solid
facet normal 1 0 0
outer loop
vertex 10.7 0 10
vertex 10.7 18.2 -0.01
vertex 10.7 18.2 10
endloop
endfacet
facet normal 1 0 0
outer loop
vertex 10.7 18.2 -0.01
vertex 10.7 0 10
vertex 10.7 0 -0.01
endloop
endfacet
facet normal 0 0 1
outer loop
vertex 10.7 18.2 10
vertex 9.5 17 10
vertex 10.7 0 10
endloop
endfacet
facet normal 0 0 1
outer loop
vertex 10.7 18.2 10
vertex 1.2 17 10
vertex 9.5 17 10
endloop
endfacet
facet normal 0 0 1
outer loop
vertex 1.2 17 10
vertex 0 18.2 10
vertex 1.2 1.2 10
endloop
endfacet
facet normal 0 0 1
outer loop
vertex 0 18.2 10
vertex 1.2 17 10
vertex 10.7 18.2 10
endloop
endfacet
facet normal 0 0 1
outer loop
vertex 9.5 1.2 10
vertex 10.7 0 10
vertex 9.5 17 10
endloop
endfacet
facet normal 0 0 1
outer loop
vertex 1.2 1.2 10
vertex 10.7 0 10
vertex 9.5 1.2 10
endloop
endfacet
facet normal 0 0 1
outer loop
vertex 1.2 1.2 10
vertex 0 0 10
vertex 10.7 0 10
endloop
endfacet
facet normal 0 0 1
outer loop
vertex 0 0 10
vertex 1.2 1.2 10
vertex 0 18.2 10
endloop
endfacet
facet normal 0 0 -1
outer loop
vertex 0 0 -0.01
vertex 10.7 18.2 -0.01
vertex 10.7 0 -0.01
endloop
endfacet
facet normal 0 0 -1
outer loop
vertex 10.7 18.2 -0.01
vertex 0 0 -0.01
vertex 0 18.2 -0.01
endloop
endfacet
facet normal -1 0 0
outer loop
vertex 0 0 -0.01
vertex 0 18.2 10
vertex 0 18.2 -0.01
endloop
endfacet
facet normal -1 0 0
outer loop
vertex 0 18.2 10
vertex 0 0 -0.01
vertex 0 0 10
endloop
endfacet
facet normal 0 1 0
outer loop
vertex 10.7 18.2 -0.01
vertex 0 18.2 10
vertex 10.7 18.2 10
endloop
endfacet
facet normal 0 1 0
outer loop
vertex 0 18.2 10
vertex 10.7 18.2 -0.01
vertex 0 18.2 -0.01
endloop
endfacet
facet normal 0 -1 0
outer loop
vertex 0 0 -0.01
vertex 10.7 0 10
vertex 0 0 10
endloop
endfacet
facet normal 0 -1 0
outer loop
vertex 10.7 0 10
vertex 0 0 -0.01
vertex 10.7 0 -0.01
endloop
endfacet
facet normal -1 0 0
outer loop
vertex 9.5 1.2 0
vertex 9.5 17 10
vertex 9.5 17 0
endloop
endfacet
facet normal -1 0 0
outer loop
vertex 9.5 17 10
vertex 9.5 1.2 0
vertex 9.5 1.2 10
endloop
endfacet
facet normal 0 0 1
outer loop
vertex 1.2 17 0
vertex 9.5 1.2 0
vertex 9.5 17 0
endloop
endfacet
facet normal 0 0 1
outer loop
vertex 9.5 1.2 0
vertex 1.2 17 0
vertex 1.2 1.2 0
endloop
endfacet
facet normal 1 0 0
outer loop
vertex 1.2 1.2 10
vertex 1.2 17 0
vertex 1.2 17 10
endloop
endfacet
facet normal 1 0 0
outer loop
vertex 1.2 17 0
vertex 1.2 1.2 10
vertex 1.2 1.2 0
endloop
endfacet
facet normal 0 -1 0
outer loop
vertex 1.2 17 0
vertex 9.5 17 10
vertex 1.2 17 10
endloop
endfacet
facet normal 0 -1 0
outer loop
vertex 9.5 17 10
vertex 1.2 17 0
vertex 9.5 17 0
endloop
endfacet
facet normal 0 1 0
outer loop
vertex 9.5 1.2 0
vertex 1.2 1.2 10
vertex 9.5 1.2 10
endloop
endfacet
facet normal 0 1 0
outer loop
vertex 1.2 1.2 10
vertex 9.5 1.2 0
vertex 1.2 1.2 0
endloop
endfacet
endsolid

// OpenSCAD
// file: ../Base/Rotation.scad
// Fischertechnik Box Foundation
// Geometry Helpers Rotation

include <PlacementOptions.scad>

// getRotatedSpace(space, rotation=NoRotation)
// Rotates the space dependent on the specified rotation

function getRotatedSpace(space, rotation=NoRotation) = [
    (rotation == Rotate90 || rotation == Rotate270) ? space.y : space.x,
    (rotation == Rotate90 || rotation == Rotate270) ? space.x : space.y
];

// Rotates the given space around the fixed left lower corner
// space = the space the children needs as width/depth list [width,depth]
// rotation = 0 Rotate0 degrees, 1 Rotate90 degrees, 2 Rotate180 degrees, 3 Rotate270 degrees (equivalent to -90)

module RotateFix(space, rotation=NoRotation) {
    dy = (rotation == Rotate0 || rotation == Rotate270) ? 0 :
        (rotation == Rotate90) ? space.x :
        space.y;
    dx = (rotation < Rotate180) ? 0 :
        (rotation == Rotate180) ? space.x :
        space.y;
    
    translate([dx, dy, 0])
        rotate([0, 0, rotations[rotation]])
            children();
}
// file: ../Base/Alignment.scad
// Fischertechnik Box Foundation
// Geometry Helpers Alignment

include <PlacementOptions.scad>

// getAlignedX(elementWidth, spaceWidth, align=AlignRight, offset=0)
// Gets the aligned X offset of an element with the given
// width in the given space.
// elementWidth = The width of the element to positon
// spaceWidth = The space where the element should be aligned
// align = 0 AlignLeft, 1 AlignCenter, 2 AlignRight
// offset = an optional offset from the aligned position. When
// aligned left or centered, then positive values are in X direction.
// When aligned right then positive values are in negative X direction.

function getAlignedX(elementWidth, spaceWidth, align=AlignRight, offset=0) =
    (align == AlignLeft) ?
        offset :
        ((align == AlignCenter) ?
        (spaceWidth - elementWidth)/2 + offset :
        spaceWidth - offset - elementWidth);

// getAlignedY(elementDepth, spaceDepth, align=AlignTop, offset=0)
// Gets the aligned Y offset of an element with the given
// depth in the given space.
// elementDepth = The depth of the element to positon
// spaceDepth = The space where the element should be aligned
// align = 0 AlignBottom, 1 AlignCenter, 2 AlignTop
// offset = an optional offset from the aligned position. When
// aligned bottom or centered, then positive values are in Y direction.
// When aligned top then positive values are in negative Y direction.

function getAlignedY(elementDepth, spaceDepth, align=AlignTop, offset=0) =
    (align == AlignBottom) ?
        offset :
        ((align == AlignCenter) ?
        (spaceDepth - elementDepth)/2 + offset :
        spaceDepth - offset - elementDepth);
// file: ../Base/PlacementOptions.scad
// Fischertechnik Box Foundation
// Placement Options

// Alignment
NoAlign = 0;
AlignLeft = 1;
AlignBottom = 2;
AlignCenter = 3;
AlignRight = 4;
AlignTop = 5;

// Element rotation degree steps
rotations = [0, -90, -180, -270];

// Rotation
NoRotation = 0;
Rotate0 = 0;
Rotate90 = 1;
Rotate180 = 2;
Rotate270 = 3;

// Docking (seen from above)
NoDock = -1;
DockLeft = 0;
DockTop = 1;
DockRight = 2;
DockCorner = 2;
DockBottom = 3;

// Web corners
LowerLeft = 0;
UpperLeft = 1;
UpperRight = 2;
LowerRight = 3;

// Web position relative to corner
LeftOfCorner = 0;
RightOfCorner = 1;

// Rails direction
Horizontal = true;
Vertical = false;
// file: ../Base/Boxes.scad
// Fischertechnik Box Foundation
// Pre-designed Boxes

use <Constants.scad>

include <PlacementOptions.scad>

box190Width = 190.6;
box190Depth = 130.6;
box130Width = 130.6;
box130Depth = 95.6;

// Values are from an original Box 1000 sorting box
topBottomDifference = 1.7;
outerHeight = 40;
baseThickness = 1.2;
innerHeight = outerHeight - baseThickness;
stackExcess = 5.7;
radius = 2.5;
wallThickness = 1.2;
tolerance = 0.2;

boxWallThickness = wallThickness;
boxBaseThickness = baseThickness;
boxWebWidth = 3.0;

// getBoxWallThickness()
// Gets the wall thickness of a Fischertechnik Box
function getBoxWallThickness() = boxWallThickness;

// getBoxUsageHeight(height = 38.2)
// Gets the usable height of a Fischertechnik box
// height = Outer height of the box from the bottom to the upper edge.
function getBoxUsageHeight(height = outerHeight) = height - baseThickness - stackExcess;

// getBoxInnerHeight()
// Gets the inner height of a Fischertechnik box, including the stack excess
function getBoxInnerHeight() = innerHeight;

// getBoxBaseThickness()
// Gets the thickness of the Fischertechnik box base.
function getBoxBaseThickness() = boxBaseThickness;

// getBoxWebWidth()
// Gets the width of a box web
function getBoxWebWidth() = boxWebWidth;

// getBox190Space()
// Gets the usable inner space of a Box 190 as an x/y-list
function getBox190Space() = [
    box190Width - 2*getBoxWallThickness() - topBottomDifference, 
    box190Depth - 2*getBoxWallThickness() - topBottomDifference ];

// RoundedCornerPlate(width, depth, height, radius)
// Creates a body plate with rounded corners for a box. Used
// also to create the complete box with the hull module.
// width = Width of the plate
// depth = depth of the plate 
// height = thickness of the plate
// radius = radius of the rounded corner
module RoundedCornerPlate(width, depth, height, radius) {
    translate([radius, radius])
    hull() {
        w = width-2*radius;
        d = depth-2*radius;
        cube([w, d, height]);
        cylinder(height, r=radius, $fn=getFragments());
        translate([w, 0])
            cylinder(height, r=radius, $fn=getFragments());
        translate([w, d])
            cylinder(height, r=radius, $fn=getFragments());
        translate([0, d])
            cylinder(height, r=radius, $fn=getFragments());
    }
}

// BoxBase(width, depth)
// Creates an empty stackable Fischertechnik compatible box
// width = Outer width of the box (190, 130, ...)
// depth = Outer depth of the box (130, 95, ...)

module BoxBase(width, depth, height=outerHeight) {    
    thinPlate = 0.01;

    innerHeight = height - baseThickness;    
    
    module Body(tolerance=tolerance) {
        hull() {
            // Bottom with tolerance to fit into the original boxes when stacked
            translate([-wallThickness+tolerance, -wallThickness+tolerance, -baseThickness])
                RoundedCornerPlate(width-topBottomDifference-2*tolerance, depth-topBottomDifference-2*tolerance, thinPlate, radius);
            
            // Top
            translate([-wallThickness-topBottomDifference/2, -wallThickness-topBottomDifference/2, innerHeight-thinPlate])
                RoundedCornerPlate(width, depth, thinPlate, radius);                
         }
    }

    module Cutoff() {
        hull() {
            coWidth = width - 2*wallThickness;
            coDepth = depth - 2*wallThickness;
            
            // Bottom
            RoundedCornerPlate(coWidth-topBottomDifference, coDepth-topBottomDifference, thinPlate, radius);

            // Top
            translate([-topBottomDifference/2, -topBottomDifference/2, innerHeight+thinPlate]) 
                RoundedCornerPlate(coWidth, coDepth, thinPlate, radius);
        }
    }
    
    difference() {        
        Body();
        Cutoff();
        stackOffset = innerHeight - stackExcess;
        translate([0, 0, stackOffset + baseThickness])
            Body(tolerance=0);
    }
}

// Creates the Fischertechnik empty box 130x190 mm and places it at position 0,0
// 190x130 are the outer sizes, the inner space is slightly smaller. Use getBox190Space() to get the inner sizes.
// The box is positioned that the usable inner space is at the 0,0,0 position.

module Box190() {
    BoxBase(box190Width, box190Depth);
}

// Gets the usable inner space of a Box 130 as an x/y-list
function getBox130Space() = [
    box130Width - 2*getBoxWallThickness() - topBottomDifference, 
    box130Depth - 2*getBoxWallThickness() - topBottomDifference ];

// Creates the Fischertechnik empty box 95x130 mm and places it at position 0,0
// 190x130 are the outer sizes, the inner space is slightly smaller. Use getBox190Space() to get the inner sizes.
// The box is positioned that the usable inner space is at the 0,0,0 position.

module Box130() {
    BoxBase(box130Width, box130Depth);
}

// Creates a web at the specified box walls
// corner 0 = LowerLeft, 1 = UpperLeft, 2 = UpperRight, 3 = LowerRight
// side 0 = LeftOfCorner, 1 = RightOfCorner
// distance = Distance in mm from the corner
// boxSpace = inner width and depth of the box (default: Box 190)
// webWidth = length of the web (default is 3 mms)
// webThickness = thickness of the web (default is 1 mm)
// height = Height of the web (standard is getBoxUsageHeight())
// sink = How much of the web is sunk into the wall

module BoxWeb(
    corner, 
    side, 
    distance, 
    boxSpace=getBox190Space(), 
    webWidth=getBoxWebWidth(), 
    webThickness=1.0, 
    height=getBoxUsageHeight(),
    sink = getBoxWallThickness()/2) {
    width = (corner % 2 == 0) ? 
            (side == LeftOfCorner ? webWidth : webThickness) :
            (side == LeftOfCorner ? webThickness : webWidth);

    depth = (corner % 2 == 0) ? 
            (side == RightOfCorner ? webWidth : webThickness) :
            (side == RightOfCorner ? webThickness : webWidth);
    
    xDiff = corner == LowerLeft ? 
                (side == LeftOfCorner ? -sink : distance) :
            (corner == UpperLeft ?                
                (side == LeftOfCorner ? distance : -sink) :
            (corner == UpperRight ?
                (side == LeftOfCorner ? boxSpace.x-webWidth+sink : boxSpace.x-distance-webThickness) :
                (side == LeftOfCorner ? boxSpace.x-distance-webThickness: boxSpace.x-webWidth+sink)));

    yDiff = corner == LowerLeft ? 
                (side == RightOfCorner ? -sink : distance) :
            (corner == UpperLeft ?
                (side == RightOfCorner ? boxSpace.y-distance-webThickness : boxSpace.y-webWidth+sink) :
            (corner == UpperRight ?
                (side == RightOfCorner ? boxSpace.y-webWidth+sink : boxSpace.y-distance-webThickness) :
                (side == RightOfCorner ? distance : -sink)));
    
    translate([xDiff, yDiff, -getExcess()])
        cube([width, depth, height + 2*getExcess()]);
}
// file: ../Base/Placement.scad
// Fischertechnik Box Foundation
// Geometry Helpers Placement

use <Constants.scad>
use <Alignment.scad>
use <Rotation.scad>
use <Boxes.scad>

include <PlacementOptions.scad>

// Place(x=0, y=0, elementSpace=[0,0], alignX=AlignLeft, alignY=AlignBottom, rotation=Rotate0, boxSpace=getBox190Space())
// Places the child at the specified position
// y = Y-Position. This is a relative position when an X aligment is specified.
// x = X-Position. This is a relative position when an Y aligment is specified.
// elementSpace = space of the element to be placed [x,y]
// alignX = -1=NoAlign, 0 AlignLeft, 1 AlignCenter, 3 AlignRight (elementSpace and boxSpace required!)
// alignY = -1=NoAlign, 2 AlignBottom, 1 AlignCenter, 4 AlignTop (elementSpace and boxSpace required!)
// rotation = 0 Rotate0 0 degrees, 1 Rotate90 90 degrees, 
// 2 Rotate180 180 degrees, 3 Rotate270 270 degrees (equivalent to -90)
// boxSpace = Inner space of the box where the placement occurs [x,y] - default is Box 190x130 inner space

module Place(x=0, y=0, elementSpace=[0,0], 
  alignX=AlignLeft, alignY=AlignBottom, 
  rotation=NoRotation, boxSpace=getBox190Space()) {

    module Position(x, y, space, rotation=Rotate0) {
        translate([x, y, 0])
            RotateFix(space, rotation)
                children();
    }

    space = getRotatedSpace(elementSpace, rotation);
    alignedX = getAlignedX(space.x, boxSpace.x, alignX, x);
    alignedY = getAlignedY(space.y, boxSpace.y, alignY, y);
    Position(alignedX, alignedY, elementSpace, rotation)
        children();
}

// Center(space=getBox130Space(), elementSpace=[0,0])
// space = Space where the children is centered. For cylinder use centered=true and no elementSpace.
// elementSpace = space of the element to be centered [x,y]

module Center(space=getBox190Space(), elementSpace=[0,0]) {
    Place(elementSpace=elementSpace, boxSpace=space, alignX=AlignCenter, alignY=AlignCenter)
        children();
}

// CenterHorizontal(width=0, y=0, offset=0, space=getBox130Space())
// width = Width of the element to be placed.
// y = Y position of the element
// offset = Offset from the center position (negative will be left of the center)
// space = Space where the element is placed

module CenterHorizontal(width=0, y=0, offset=0, space=getBox190Space()) {
    Place(x=offset, y=y, elementSpace=[width, 0], boxSpace=space, alignX=AlignCenter)
        children(0);
}

// CenterVertical(depth=0, x=0, offset=0, space=getBox130Space())
// depth = Depth of the element to be placed.
// x = X position of the element
// offset = Offset from the center position (negative will be down of the center)
// space = Space where the element is placed

module CenterVertical(depth=0, x=0, offset=0, space=getBox190Space()) {
    Place(x=x, y=offset, elementSpace=[0, depth], boxSpace=space, alignY=AlignCenter)
        children(0);
}

// getIsVertical(align)
// True if the specified alignment needs a vertical orientation for a divider (AlignRight, AlignLeft)

function getIsVertical(align) = (align == AlignRight || align == AlignLeft);

// getIsHorizontal(align)
// True if the specified alignment needs a horizontal orientation for a divider (AlignTop, AlignBottom)

function getIsHorizontal(align) = (align == AlignTop || align == AlignBottom);
// file: ../Base/Constants.scad
// Fischertechnik Box Foundation
// Constants

// Constant values necessary for multiple elements

// Base constants
dividerThickness = 1.2;
excess = 0.01;
fragments = 90;
tolerance = 0.8;

// Gets the thickness of a divider 
function getDividerThickness() = dividerThickness;

// Gets the excess that is used to merge walls into each other
function getExcess() = excess;

// Gets amount of fragments of a cylinder
function getFragments() = fragments;

// Gets the inner tolerance of a frame to each side
function getTolerance() = tolerance;


// Fischertechnik specific constants
axisDiameter = 4;
axisBottomDiameter = axisDiameter + 1;
axisTolerance = 0.2;
axisLockingLength = 8;

// Gets axis diameter of Fischertechnik axis
function getAxisDiameter() = axisDiameter;

// Gets axis diameter tolerance (subtracted for element axis)
function getAxisTolerance() = axisTolerance;

// Gets the axis diameter for standing axis
function getStandAxisDiameter() = getAxisDiameter() - getAxisTolerance();

// Gets axis bottom diameter for thicker part at the bottom
function getAxisBottomDiameter() = axisBottomDiameter;

// Gets the lengthh of the locking part of a locking axis
function getAxisLockingLength() = axisLockingLength;

// Studs

studHeight = 2.5;
studTolerance = 0.2;
studRailDistance = 9;   // as in ft 50

// gets the height of a connecting stud
function getStudHeight() = studHeight;

// gets the connecting stud height tolerance
function getStudTolerance() = studTolerance;

// gets the default rail distance for studs
function getStudRailDistance() = studRailDistance;

// Dockable Frame with Edge

standardEdgeDistance = 2.5;
standardWebDistance = 11.5;
standardCornerLength = 15;

// gets the standard distance to the wall of the box for dockable frames with webs
function getStandardEdgeDistance() = standardEdgeDistance;

// gets the standard distance of each web to the corner of the dockable frame
function getStandardWebDistance() = standardWebDistance;

// gets the standard length of the corner walls of a dockable frame
function getStandardCornerLength() = standardCornerLength;

// Tubes

tubeWallFactor = 0.8;

// gets the wall thickness of a tube.
function getTubeWallThickness() = tubeWallFactor * getDividerThickness();

// Small Parts and Divider Frame

smallPartsFrameHeight = 20;

// gets the frame height for docked small parts boxes.
function getSmallPartsFrameHeight() = smallPartsFrameHeight;

// Hubs

hubRingDiameter = 19.5;
hubRingLevelDiameter = 21;

// gets the diameter of a tube matching the inner ring of a wheel
function getHubRingDiameter() = hubRingDiameter;

// gets the diameter of a hub tube with a thicker diameter
function getHubRingLevelDiameter() = hubRingLevelDiameter;

// Struts

strutAddLength = 9.0;
strutDepth = 8.0;
strutThickness = 2.8;
strutOuterTolerance = 0.6;

// gets the full length of a strut (nominal length plus 2x radius at the ends)
function getFullStrutLength(length) = length + strutAddLength;

// gets the radius of the end of a strut
function getStrutEndRadius() = strutAddLength / 2;

// gets the the depth (width) of a strut
function getStrutDepth() = strutDepth;

// gets the the thickness of a strut
function getStrutThickness() = strutThickness;

// gets the tolerance added to the strut sizes for strut holders
function getStrutOuterTolerance() = strutOuterTolerance;

// Propeller

propellerAxisDiameter = 7.0;
propellerAxisTolerance = 0.2;

// gets the propeller axis outer diameter
function getPropellerAxisDiameter() = propellerAxisDiameter;

// gets the propeller axis printing tolerance
function getPropellerAxisTolerance() = propellerAxisTolerance;
// main file
// Fischertechnik Box Library
// Frame for small blocks 5
// 37237, 37468

use <../Base/Constants.scad>
use <../ModelBase/Simple.scad>

/* [Element Parameters] */
count = 1;

/* [Hidden] */
width = 7.5;
depth = 15;
height = 10;
wallThickness = 2.5 - getTolerance();
wallHeight = 7.5;
wallCutoffWidth = 10;
wallDistance = 5 + getTolerance();

// getFrameSmallBlockSpace(count=1)
// Gets the space of a frame for count blocks 5mm

function getFrameBlock5Space(count=1) = getFrameOuterVolume([width * count, depth, height]);

// FrameSmallBlock(count=1)
// frame for count blocks 5mm

module FrameBlock5(count=1) {
    frameVolume = [width * count, depth, height];

    module InnerDivider(count) {
        volume = [wallThickness, depth + getTolerance() + 2*getExcess(), wallHeight];
        cutoffVolume = [wallThickness+1, wallCutoffWidth, wallHeight + 1];
        for(i = [1:count])
            translate([getDividerThickness() + ((i - 1) * width) + wallDistance, getDividerThickness()-getExcess()]) {
                difference() {
                    Wall(volume);
                    translate([-0.5, (getFrameInnerVolume(frameVolume).y - wallCutoffWidth)/2])
                    cube(cutoffVolume);
                }
            }
    }

    Frame(frameVolume);
    if (count > 1)
        InnerDivider(count - 1);
}

// Tests
color("lightgray")
FrameBlock5(count);
